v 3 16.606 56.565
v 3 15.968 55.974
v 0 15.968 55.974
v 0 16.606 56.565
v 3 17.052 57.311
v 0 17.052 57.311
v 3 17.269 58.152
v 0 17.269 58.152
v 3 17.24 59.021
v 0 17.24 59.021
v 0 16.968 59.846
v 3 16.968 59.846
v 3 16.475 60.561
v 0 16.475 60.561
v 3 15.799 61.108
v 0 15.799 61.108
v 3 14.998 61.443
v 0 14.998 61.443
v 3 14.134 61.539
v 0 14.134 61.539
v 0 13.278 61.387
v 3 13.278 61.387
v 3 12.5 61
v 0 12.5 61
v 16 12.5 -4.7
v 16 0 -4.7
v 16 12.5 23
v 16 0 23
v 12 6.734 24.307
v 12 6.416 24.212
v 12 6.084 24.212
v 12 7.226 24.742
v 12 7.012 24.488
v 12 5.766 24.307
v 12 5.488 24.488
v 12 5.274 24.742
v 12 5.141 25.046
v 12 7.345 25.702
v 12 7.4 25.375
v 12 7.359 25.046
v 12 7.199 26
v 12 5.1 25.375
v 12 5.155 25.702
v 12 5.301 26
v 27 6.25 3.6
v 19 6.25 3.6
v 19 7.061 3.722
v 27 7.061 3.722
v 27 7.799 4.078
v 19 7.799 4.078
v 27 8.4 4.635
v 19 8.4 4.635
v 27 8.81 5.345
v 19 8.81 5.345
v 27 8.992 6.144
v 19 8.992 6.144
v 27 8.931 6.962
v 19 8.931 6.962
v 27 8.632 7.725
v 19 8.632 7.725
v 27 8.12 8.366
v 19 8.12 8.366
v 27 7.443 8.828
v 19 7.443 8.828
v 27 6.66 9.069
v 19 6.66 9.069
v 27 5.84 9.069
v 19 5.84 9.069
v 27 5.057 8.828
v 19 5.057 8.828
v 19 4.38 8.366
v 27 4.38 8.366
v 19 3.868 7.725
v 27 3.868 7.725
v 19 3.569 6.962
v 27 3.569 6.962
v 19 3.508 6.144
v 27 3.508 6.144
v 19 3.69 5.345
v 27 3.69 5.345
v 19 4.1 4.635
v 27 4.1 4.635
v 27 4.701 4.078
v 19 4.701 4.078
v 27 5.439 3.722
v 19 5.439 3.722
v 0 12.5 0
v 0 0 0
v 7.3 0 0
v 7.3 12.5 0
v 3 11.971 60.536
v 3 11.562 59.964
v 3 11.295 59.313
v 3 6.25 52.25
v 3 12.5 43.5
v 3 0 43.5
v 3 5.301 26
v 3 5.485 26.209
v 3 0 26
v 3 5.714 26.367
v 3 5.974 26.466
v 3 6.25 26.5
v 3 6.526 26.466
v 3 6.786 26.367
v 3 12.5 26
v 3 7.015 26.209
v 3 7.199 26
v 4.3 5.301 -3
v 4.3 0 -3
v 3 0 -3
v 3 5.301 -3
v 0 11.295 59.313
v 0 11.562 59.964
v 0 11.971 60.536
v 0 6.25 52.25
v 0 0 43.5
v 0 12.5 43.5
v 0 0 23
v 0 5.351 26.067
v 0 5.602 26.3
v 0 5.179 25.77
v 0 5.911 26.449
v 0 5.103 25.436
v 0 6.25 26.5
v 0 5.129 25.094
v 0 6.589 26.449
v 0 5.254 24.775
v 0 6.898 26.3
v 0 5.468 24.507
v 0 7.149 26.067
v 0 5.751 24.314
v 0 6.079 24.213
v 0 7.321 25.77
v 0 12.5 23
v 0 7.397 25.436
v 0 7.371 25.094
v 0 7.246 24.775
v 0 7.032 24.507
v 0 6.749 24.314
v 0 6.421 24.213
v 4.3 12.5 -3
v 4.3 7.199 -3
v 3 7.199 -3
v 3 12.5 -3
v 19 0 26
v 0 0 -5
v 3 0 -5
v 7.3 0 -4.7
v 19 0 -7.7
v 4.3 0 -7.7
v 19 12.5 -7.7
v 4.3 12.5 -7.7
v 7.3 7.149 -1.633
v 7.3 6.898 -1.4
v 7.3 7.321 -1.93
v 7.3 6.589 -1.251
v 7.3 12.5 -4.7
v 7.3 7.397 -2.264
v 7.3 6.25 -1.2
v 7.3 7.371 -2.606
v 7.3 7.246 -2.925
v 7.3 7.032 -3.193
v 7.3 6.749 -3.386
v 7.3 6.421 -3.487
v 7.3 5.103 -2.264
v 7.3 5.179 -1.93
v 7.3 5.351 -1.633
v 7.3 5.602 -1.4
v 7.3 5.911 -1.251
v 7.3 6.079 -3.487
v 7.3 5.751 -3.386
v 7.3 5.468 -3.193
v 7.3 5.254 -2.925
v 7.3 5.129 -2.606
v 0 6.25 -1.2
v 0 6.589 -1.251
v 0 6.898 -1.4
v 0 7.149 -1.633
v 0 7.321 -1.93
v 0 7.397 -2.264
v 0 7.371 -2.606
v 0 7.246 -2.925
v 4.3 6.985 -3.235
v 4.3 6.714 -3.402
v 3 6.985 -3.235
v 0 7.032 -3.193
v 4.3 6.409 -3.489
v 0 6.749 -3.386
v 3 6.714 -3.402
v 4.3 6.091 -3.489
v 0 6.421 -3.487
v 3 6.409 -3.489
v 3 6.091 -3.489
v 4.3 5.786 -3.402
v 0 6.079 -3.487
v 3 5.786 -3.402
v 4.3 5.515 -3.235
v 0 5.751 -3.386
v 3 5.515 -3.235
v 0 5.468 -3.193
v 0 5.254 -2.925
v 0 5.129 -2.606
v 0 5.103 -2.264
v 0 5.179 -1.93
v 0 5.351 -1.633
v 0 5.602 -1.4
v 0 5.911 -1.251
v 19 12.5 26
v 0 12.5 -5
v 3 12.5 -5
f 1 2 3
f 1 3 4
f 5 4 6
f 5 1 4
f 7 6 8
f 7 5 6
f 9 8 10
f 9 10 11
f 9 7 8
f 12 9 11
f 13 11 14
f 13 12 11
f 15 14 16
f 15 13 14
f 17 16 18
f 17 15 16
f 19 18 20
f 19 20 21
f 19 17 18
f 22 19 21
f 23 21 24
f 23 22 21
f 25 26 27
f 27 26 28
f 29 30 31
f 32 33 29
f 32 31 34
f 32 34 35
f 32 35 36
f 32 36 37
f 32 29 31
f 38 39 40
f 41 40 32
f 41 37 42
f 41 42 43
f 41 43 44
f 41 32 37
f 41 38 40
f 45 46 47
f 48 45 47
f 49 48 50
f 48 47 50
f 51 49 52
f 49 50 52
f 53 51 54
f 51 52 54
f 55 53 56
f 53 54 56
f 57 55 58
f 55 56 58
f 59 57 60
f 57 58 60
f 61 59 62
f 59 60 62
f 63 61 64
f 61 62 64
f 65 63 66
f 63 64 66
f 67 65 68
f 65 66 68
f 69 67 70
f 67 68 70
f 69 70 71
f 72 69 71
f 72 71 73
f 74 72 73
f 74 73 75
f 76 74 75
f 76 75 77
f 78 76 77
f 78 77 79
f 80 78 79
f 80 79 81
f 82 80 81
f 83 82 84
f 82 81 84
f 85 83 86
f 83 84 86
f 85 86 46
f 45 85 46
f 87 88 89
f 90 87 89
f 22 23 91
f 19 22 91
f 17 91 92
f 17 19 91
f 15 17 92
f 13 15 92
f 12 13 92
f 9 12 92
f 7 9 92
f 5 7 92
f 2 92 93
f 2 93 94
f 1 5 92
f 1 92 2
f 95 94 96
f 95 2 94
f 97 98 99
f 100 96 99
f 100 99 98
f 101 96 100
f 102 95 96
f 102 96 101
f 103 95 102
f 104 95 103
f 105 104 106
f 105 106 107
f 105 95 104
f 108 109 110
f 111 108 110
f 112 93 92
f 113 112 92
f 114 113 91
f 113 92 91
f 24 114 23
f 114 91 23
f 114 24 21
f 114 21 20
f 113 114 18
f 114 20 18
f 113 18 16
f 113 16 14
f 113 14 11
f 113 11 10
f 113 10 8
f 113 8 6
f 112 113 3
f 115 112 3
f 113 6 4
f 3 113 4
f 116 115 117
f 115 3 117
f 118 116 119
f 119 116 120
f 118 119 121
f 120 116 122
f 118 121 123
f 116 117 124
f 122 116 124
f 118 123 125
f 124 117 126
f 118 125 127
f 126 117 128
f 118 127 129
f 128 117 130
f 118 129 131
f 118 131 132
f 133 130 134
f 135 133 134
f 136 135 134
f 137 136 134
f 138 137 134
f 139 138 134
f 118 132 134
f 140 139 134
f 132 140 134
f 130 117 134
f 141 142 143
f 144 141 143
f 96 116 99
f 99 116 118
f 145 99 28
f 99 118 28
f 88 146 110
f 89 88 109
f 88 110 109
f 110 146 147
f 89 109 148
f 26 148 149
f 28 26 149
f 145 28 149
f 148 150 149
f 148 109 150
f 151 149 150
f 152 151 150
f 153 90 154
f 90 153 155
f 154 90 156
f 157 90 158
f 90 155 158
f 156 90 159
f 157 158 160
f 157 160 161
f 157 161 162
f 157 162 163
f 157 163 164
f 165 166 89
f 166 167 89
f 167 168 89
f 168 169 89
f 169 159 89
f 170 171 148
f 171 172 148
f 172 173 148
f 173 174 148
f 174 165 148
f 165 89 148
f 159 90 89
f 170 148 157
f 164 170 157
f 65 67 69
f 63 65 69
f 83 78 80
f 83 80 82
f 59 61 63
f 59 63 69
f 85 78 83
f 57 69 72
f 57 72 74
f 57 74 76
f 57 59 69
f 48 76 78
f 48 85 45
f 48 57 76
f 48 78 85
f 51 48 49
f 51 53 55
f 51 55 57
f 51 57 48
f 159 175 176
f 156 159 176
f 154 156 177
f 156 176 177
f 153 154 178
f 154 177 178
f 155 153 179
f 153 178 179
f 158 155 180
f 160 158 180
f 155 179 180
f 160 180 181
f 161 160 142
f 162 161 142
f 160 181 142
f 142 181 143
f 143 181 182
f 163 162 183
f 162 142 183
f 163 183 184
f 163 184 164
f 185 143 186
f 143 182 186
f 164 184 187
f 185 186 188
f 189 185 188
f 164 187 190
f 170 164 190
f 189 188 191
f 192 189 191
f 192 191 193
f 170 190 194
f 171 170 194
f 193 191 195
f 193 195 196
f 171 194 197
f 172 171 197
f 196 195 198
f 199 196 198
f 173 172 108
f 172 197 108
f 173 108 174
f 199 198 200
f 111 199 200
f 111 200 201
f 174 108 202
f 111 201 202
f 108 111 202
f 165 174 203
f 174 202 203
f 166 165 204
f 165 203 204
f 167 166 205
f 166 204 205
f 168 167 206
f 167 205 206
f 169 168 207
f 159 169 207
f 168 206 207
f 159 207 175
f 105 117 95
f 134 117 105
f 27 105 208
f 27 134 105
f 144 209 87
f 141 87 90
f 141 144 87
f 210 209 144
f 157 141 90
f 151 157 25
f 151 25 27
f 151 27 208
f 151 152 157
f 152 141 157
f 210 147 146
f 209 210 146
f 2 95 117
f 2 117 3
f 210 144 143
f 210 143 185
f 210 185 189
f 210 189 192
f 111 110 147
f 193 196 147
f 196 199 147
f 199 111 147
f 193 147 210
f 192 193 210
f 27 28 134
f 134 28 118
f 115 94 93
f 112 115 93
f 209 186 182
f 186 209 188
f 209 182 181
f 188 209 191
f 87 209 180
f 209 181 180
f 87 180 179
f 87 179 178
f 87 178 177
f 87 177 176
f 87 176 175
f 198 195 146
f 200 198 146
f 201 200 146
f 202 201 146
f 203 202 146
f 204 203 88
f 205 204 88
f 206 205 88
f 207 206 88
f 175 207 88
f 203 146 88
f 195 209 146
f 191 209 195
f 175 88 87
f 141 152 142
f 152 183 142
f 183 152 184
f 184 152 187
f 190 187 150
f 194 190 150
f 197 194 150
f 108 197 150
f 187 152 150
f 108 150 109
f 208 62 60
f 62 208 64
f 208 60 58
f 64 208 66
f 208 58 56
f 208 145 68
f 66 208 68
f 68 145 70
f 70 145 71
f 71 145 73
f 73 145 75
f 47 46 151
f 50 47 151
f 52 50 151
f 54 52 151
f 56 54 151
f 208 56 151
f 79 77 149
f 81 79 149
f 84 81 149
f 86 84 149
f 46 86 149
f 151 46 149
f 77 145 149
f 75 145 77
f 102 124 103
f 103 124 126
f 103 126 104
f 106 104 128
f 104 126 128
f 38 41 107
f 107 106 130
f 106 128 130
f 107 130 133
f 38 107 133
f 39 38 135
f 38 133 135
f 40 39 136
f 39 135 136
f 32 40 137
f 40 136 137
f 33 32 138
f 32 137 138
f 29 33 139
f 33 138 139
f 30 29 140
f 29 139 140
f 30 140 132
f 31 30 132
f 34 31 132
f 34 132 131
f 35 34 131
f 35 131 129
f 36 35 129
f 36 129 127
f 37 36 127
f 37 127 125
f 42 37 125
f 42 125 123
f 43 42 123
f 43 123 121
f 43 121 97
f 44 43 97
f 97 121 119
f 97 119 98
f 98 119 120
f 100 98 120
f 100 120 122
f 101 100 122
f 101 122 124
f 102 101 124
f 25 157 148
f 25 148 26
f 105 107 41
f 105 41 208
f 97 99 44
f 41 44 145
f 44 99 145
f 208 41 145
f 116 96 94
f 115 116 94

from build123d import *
from build123d.topology import SkipClean

# Parameters (mm, degrees)
EXTRUDE_1_DEPTH     = 12.5
SKETCH_2_R          = 1.15
CUT_EXTRUDE_1_DEPTH = 12
SKETCH_3_R          = 2.75
EXTRUDE_2_DEPTH     = 8
EXTRUDE_3_DEPTH     = 3
CUT_EXTRUDE_5_DEPTH = 3


with BuildPart() as part:
    # 草图1 → 凸台-拉伸1 (new body)
    with BuildSketch(Plane(origin=(0, 0, 0), x_dir=(1, 0, 0), z_dir=(0, 1, 0))):
        Polygon((0, 5), (0, 0), (7.3, 0), (7.3, 3), (7.3, 4.7), (16, 4.7), (16, 3), (16, 0), (16, -23), (0, -23), (0, -61), (3, -61), (3, -26), (19, -26), (19, 3), (19, 7.7), (4.3, 7.7), (4.3, 3), (3, 3), (3, 5), align=None)
    extrude(amount=EXTRUDE_1_DEPTH)

    # 草图2 → 切除-拉伸1 (cut)
    with BuildSketch(Plane.ZY):
        with Locations((25.35, 6.25)):
            Circle(SKETCH_2_R)
        with Locations((-2.35, 6.25)):
            Circle(SKETCH_2_R)
    extrude(amount=-CUT_EXTRUDE_1_DEPTH, mode=Mode.SUBTRACT)

    # 草图3 → 凸台-拉伸2 (add)
    with BuildSketch(Plane(origin=(19, 0, 0), x_dir=(0, 0, -1), z_dir=(1, 0, 0))):
        with Locations((-6.35, 6.25)):
            Circle(SKETCH_3_R)
    extrude(amount=EXTRUDE_2_DEPTH)

    # 草图4 → 凸台-拉伸3 (add)
    with BuildSketch(Plane(origin=(3, 0, 0), x_dir=(0, 0, -1), z_dir=(1, 0, 0))):
        with BuildLine():
            Line((-43.5, 12.5), (-55.974372634, 15.968285379))
            ThreePointArc((-55.974372634, 15.968285379), (-60.221329006, 16.746956372), (-61, 12.5))
            Line((-61, 12.5), (-43.5, 12.5))
        make_face()
    extrude(amount=-EXTRUDE_3_DEPTH)

    # 草图4<8> → 切除-拉伸5 (cut)
    with SkipClean():  # the faces are left unmerged after this step: merging them gives an invalid solid
        with BuildSketch(Plane(origin=(3, 0, 0), x_dir=(0, 0, -1), z_dir=(1, 0, 0))):
            with BuildLine():
                Line((-43.5, 0), (-52.25, 6.25))
                Line((-52.25, 6.25), (-59.312624964, 11.294732117))
                ThreePointArc((-59.312624964, 11.294732117), (-60.261770725, 11.749724518), (-61, 12.5))
                Line((-61, 12.5), (-61, 0))
                Line((-61, 0), (-43.5, 0))
            make_face()
        extrude(amount=-CUT_EXTRUDE_5_DEPTH, mode=Mode.SUBTRACT)


solid = part.part
